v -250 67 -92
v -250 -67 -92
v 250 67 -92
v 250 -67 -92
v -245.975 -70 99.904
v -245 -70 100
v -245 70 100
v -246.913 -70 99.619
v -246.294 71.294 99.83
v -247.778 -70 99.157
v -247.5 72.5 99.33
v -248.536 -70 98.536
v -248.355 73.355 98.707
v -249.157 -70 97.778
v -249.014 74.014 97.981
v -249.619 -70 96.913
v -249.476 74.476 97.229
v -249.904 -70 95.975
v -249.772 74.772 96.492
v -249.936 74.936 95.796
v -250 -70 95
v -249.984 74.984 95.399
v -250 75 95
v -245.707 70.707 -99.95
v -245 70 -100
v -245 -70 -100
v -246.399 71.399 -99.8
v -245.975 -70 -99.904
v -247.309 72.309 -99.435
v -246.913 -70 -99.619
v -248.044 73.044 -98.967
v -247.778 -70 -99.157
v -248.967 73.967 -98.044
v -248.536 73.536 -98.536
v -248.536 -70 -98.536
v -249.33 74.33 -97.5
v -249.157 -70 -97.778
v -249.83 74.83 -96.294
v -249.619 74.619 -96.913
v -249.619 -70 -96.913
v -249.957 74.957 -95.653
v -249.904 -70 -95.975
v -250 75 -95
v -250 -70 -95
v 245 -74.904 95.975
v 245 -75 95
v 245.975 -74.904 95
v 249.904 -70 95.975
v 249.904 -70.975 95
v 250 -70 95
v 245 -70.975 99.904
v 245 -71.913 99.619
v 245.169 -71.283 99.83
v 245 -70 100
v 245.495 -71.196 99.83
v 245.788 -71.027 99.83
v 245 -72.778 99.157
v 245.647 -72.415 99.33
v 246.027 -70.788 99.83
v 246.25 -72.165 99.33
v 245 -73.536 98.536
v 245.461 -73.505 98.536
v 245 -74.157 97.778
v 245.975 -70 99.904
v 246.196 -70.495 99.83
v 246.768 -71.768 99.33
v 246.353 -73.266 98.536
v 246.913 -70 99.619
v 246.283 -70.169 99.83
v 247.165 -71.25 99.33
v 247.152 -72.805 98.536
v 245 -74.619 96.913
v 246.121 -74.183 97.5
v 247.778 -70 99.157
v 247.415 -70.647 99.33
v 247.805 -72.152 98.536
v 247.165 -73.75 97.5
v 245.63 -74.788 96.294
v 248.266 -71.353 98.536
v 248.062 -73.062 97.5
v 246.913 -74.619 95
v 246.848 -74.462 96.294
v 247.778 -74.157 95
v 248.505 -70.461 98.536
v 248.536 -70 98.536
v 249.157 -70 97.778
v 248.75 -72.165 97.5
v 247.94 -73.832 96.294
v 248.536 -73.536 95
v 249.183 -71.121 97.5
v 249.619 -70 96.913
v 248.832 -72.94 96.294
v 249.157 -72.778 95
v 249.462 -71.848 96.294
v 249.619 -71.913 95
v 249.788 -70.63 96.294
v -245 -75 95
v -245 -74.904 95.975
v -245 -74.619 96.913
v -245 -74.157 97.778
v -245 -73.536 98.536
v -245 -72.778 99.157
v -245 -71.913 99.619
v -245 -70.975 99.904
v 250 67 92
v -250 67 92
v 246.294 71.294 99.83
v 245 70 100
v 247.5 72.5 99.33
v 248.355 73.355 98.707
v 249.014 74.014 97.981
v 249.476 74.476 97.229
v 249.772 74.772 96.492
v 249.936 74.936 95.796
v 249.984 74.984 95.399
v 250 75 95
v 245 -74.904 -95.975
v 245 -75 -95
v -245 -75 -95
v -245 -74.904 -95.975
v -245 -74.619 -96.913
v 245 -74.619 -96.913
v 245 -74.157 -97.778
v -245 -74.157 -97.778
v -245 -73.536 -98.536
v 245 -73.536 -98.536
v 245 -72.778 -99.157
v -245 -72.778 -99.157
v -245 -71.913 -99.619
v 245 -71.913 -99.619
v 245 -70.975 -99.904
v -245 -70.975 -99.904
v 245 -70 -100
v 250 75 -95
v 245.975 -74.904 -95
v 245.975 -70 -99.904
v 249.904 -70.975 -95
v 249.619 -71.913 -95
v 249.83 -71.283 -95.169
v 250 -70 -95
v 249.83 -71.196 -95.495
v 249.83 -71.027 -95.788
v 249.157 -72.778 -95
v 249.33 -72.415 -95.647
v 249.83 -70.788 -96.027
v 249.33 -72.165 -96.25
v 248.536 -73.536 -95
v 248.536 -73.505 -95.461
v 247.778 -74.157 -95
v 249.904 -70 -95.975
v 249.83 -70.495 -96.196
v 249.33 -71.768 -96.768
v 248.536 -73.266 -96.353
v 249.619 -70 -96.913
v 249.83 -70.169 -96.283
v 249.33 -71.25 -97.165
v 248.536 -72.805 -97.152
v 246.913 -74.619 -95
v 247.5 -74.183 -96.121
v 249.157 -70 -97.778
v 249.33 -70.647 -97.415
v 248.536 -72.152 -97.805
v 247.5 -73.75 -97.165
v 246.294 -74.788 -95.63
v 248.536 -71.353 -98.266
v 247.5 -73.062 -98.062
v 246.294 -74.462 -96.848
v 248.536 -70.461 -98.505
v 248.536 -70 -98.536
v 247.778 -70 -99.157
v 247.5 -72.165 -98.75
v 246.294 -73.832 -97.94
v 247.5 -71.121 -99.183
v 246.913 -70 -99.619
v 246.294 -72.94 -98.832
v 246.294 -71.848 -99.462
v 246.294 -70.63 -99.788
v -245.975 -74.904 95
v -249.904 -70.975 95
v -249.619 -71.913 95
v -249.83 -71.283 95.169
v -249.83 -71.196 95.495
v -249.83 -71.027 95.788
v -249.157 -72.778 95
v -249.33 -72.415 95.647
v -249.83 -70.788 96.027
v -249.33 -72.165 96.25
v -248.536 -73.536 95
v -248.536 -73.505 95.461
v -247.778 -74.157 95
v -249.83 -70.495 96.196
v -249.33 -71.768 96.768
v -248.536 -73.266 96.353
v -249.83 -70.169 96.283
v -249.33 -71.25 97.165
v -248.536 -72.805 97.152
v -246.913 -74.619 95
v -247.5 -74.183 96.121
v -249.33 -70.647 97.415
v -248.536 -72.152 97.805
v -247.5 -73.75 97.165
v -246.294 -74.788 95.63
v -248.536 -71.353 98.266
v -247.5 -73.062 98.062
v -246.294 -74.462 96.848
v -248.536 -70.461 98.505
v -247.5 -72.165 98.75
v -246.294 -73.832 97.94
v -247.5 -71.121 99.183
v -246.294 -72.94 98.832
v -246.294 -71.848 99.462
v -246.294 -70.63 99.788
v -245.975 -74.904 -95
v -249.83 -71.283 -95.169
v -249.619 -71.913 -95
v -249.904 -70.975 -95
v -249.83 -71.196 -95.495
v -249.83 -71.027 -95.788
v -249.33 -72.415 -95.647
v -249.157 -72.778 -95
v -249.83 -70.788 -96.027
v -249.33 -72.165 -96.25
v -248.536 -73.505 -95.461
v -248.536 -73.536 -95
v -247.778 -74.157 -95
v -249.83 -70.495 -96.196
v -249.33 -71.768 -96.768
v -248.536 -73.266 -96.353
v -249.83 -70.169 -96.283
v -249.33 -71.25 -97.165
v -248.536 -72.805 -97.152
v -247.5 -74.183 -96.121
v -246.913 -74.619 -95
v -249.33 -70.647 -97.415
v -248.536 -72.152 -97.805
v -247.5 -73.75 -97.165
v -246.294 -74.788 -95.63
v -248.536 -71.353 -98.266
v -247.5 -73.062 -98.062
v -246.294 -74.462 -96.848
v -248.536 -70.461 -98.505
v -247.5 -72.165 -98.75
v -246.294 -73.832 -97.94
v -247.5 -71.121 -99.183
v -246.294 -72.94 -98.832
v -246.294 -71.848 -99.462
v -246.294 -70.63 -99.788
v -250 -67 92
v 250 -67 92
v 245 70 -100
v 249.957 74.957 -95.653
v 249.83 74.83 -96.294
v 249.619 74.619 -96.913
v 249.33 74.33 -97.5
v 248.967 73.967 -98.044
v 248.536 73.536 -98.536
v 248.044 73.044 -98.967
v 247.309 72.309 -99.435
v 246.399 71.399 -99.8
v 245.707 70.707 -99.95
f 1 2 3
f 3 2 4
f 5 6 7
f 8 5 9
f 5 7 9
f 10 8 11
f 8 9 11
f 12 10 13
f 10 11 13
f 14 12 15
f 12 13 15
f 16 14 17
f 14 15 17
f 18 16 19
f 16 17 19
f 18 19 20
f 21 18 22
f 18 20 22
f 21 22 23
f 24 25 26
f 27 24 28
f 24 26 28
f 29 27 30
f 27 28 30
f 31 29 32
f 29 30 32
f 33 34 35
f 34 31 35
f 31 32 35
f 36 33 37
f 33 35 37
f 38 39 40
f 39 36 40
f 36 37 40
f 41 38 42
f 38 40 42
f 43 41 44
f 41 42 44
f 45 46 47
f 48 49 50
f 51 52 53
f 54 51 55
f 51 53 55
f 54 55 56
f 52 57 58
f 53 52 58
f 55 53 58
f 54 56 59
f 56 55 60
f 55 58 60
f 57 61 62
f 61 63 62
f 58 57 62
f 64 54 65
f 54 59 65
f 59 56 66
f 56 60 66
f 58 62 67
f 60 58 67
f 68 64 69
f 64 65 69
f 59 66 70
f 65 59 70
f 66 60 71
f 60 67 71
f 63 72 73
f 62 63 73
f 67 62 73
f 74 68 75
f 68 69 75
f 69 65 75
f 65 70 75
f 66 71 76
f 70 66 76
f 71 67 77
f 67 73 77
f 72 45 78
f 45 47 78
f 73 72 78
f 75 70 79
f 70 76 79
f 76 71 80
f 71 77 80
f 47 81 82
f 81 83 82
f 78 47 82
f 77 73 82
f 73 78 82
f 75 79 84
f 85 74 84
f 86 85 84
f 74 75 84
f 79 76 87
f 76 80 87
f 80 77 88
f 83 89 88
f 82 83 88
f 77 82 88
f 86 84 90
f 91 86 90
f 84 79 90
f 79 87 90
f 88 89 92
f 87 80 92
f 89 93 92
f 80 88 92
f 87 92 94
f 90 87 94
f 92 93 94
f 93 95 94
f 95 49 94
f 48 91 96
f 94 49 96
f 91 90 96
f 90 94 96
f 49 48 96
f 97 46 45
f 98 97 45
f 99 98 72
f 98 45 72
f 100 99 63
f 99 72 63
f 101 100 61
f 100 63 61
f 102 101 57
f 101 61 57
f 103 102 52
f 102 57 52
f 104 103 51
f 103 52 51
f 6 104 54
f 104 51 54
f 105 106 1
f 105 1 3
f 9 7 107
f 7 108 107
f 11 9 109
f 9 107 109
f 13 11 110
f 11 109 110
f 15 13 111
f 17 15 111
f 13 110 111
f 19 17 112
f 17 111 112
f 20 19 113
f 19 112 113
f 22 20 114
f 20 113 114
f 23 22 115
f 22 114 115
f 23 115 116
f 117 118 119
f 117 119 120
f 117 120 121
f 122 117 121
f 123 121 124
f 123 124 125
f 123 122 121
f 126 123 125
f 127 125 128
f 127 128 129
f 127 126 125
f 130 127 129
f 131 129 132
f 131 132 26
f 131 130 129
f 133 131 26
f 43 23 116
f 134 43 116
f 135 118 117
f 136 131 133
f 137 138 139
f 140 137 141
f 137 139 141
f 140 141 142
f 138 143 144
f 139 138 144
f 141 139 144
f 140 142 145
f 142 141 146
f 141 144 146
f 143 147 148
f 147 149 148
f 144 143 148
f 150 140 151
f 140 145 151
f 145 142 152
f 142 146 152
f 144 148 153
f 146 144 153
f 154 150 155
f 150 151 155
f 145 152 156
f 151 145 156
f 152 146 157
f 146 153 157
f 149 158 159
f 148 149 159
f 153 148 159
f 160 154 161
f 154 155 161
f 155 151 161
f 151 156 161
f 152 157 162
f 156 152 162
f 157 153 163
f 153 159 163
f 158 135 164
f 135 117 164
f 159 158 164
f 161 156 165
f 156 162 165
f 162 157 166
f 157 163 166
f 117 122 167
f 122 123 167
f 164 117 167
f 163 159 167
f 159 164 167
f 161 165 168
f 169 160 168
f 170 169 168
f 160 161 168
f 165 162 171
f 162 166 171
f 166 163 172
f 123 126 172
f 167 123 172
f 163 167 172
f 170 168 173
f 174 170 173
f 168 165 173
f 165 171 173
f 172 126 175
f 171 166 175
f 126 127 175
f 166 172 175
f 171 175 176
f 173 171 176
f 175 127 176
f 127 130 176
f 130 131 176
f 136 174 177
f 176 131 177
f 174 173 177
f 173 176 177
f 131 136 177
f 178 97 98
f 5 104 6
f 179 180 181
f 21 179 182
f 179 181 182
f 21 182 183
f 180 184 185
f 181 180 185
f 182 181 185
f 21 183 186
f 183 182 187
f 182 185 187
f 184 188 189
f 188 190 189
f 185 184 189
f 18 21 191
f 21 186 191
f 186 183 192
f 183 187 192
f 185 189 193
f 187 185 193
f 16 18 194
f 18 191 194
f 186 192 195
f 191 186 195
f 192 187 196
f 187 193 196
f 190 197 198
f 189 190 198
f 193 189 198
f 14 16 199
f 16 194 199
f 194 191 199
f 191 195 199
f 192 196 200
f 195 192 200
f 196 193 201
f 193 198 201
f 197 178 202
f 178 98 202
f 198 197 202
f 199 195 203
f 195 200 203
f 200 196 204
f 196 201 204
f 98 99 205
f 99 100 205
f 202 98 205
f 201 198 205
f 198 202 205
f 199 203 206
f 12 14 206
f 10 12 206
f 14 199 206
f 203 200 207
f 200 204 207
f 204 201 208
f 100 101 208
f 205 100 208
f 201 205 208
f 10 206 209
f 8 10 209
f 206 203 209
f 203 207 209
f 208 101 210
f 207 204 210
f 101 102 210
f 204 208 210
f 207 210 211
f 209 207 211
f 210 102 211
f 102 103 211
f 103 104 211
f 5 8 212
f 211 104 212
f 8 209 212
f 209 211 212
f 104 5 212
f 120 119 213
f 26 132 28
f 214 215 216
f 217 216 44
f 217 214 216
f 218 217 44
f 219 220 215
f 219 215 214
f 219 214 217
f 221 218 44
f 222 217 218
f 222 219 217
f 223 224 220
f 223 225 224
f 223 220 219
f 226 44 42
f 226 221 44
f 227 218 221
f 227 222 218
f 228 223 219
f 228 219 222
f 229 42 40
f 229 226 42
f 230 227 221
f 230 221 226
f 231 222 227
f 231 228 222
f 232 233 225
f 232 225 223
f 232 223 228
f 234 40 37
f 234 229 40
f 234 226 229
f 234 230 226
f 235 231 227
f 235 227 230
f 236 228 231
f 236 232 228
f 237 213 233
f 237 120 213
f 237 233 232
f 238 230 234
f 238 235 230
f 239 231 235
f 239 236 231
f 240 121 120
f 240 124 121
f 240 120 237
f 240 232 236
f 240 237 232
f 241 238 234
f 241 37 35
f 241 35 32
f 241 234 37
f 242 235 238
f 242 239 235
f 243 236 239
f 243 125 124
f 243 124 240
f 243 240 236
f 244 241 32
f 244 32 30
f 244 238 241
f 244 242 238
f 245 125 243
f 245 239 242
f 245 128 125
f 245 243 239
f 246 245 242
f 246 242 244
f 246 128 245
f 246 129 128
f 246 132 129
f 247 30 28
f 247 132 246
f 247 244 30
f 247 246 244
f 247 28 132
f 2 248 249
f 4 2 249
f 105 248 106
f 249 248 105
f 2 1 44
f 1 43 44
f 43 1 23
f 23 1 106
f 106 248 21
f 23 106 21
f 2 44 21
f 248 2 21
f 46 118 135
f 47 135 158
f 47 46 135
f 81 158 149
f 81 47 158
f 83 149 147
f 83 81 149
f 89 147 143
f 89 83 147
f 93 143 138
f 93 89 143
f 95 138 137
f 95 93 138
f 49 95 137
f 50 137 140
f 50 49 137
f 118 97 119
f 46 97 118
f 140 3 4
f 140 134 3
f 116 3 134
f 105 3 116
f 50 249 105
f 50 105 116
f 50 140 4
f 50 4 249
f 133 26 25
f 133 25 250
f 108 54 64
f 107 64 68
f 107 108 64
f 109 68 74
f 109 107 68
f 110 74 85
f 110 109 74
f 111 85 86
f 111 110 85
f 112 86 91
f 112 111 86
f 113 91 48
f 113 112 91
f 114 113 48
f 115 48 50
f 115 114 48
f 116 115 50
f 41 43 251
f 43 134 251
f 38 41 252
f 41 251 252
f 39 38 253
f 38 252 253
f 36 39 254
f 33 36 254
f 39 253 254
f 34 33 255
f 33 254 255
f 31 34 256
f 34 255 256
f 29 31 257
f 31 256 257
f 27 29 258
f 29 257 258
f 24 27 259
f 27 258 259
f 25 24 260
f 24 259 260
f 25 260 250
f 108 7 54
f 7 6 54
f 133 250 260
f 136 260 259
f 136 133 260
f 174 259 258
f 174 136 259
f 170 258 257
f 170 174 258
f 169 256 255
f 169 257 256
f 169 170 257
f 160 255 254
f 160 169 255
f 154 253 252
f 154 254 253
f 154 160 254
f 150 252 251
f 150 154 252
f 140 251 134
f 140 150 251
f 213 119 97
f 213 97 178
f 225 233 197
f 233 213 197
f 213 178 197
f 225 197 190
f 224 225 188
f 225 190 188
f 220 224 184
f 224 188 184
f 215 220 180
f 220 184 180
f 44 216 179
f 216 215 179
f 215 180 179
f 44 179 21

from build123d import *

# Parameters (mm, degrees)
F0_W     = 500
F0_H     = 200
F0_R     = 14
F0_R_2   = 17
F0_R_3   = 26.5
F1_DEPTH = 75
F2_T     = -8
F3_R     = 5


with BuildPart() as f1:
    # F0 (on Front) → F1 (new body, symmetric)
    with BuildSketch(Plane.XZ):
        Rectangle(F0_W, F0_H)
        with Locations((-210, 0)):
            Circle(F0_R, mode=Mode.SUBTRACT)
        with Locations((-140, 0)):
            Circle(F0_R, mode=Mode.SUBTRACT)
        with Locations((-70, 0)):
            Circle(F0_R, mode=Mode.SUBTRACT)
        Circle(F0_R_2, mode=Mode.SUBTRACT)
        with Locations((80, 0)):
            Circle(F0_R_3, mode=Mode.SUBTRACT)
        with Locations((-210, 0)):
            Circle(F0_R)
        with Locations((-140, 0)):
            Circle(F0_R)
        with Locations((-70, 0)):
            Circle(F0_R)
        Circle(F0_R_2)
        with Locations((80, 0)):
            Circle(F0_R_3)
    extrude(amount=F1_DEPTH, both=True)

    # F2
    f2_openings = [f1.faces().sort_by_distance(p)[0] for p in [
        (250, 0, 0),
        (-250, 0, 0),
    ]]
    offset(amount=F2_T, openings=f2_openings)

    # F3
    f3_edges = [f1.edges().sort_by_distance(p)[0] for p in [
        (0, 75, 100),
        (0, -75, -100),
        (250, -75, 0),
        (0, -75, 100),
        (-250, -75, 0),
        (250, 0, 100),
        (-250, 0, 100),
        (0, 75, -100),
        (250, 0, -100),
        (-250, 0, -100),
    ]]
    fillet(f3_edges, radius=F3_R)


solid = f1.part
